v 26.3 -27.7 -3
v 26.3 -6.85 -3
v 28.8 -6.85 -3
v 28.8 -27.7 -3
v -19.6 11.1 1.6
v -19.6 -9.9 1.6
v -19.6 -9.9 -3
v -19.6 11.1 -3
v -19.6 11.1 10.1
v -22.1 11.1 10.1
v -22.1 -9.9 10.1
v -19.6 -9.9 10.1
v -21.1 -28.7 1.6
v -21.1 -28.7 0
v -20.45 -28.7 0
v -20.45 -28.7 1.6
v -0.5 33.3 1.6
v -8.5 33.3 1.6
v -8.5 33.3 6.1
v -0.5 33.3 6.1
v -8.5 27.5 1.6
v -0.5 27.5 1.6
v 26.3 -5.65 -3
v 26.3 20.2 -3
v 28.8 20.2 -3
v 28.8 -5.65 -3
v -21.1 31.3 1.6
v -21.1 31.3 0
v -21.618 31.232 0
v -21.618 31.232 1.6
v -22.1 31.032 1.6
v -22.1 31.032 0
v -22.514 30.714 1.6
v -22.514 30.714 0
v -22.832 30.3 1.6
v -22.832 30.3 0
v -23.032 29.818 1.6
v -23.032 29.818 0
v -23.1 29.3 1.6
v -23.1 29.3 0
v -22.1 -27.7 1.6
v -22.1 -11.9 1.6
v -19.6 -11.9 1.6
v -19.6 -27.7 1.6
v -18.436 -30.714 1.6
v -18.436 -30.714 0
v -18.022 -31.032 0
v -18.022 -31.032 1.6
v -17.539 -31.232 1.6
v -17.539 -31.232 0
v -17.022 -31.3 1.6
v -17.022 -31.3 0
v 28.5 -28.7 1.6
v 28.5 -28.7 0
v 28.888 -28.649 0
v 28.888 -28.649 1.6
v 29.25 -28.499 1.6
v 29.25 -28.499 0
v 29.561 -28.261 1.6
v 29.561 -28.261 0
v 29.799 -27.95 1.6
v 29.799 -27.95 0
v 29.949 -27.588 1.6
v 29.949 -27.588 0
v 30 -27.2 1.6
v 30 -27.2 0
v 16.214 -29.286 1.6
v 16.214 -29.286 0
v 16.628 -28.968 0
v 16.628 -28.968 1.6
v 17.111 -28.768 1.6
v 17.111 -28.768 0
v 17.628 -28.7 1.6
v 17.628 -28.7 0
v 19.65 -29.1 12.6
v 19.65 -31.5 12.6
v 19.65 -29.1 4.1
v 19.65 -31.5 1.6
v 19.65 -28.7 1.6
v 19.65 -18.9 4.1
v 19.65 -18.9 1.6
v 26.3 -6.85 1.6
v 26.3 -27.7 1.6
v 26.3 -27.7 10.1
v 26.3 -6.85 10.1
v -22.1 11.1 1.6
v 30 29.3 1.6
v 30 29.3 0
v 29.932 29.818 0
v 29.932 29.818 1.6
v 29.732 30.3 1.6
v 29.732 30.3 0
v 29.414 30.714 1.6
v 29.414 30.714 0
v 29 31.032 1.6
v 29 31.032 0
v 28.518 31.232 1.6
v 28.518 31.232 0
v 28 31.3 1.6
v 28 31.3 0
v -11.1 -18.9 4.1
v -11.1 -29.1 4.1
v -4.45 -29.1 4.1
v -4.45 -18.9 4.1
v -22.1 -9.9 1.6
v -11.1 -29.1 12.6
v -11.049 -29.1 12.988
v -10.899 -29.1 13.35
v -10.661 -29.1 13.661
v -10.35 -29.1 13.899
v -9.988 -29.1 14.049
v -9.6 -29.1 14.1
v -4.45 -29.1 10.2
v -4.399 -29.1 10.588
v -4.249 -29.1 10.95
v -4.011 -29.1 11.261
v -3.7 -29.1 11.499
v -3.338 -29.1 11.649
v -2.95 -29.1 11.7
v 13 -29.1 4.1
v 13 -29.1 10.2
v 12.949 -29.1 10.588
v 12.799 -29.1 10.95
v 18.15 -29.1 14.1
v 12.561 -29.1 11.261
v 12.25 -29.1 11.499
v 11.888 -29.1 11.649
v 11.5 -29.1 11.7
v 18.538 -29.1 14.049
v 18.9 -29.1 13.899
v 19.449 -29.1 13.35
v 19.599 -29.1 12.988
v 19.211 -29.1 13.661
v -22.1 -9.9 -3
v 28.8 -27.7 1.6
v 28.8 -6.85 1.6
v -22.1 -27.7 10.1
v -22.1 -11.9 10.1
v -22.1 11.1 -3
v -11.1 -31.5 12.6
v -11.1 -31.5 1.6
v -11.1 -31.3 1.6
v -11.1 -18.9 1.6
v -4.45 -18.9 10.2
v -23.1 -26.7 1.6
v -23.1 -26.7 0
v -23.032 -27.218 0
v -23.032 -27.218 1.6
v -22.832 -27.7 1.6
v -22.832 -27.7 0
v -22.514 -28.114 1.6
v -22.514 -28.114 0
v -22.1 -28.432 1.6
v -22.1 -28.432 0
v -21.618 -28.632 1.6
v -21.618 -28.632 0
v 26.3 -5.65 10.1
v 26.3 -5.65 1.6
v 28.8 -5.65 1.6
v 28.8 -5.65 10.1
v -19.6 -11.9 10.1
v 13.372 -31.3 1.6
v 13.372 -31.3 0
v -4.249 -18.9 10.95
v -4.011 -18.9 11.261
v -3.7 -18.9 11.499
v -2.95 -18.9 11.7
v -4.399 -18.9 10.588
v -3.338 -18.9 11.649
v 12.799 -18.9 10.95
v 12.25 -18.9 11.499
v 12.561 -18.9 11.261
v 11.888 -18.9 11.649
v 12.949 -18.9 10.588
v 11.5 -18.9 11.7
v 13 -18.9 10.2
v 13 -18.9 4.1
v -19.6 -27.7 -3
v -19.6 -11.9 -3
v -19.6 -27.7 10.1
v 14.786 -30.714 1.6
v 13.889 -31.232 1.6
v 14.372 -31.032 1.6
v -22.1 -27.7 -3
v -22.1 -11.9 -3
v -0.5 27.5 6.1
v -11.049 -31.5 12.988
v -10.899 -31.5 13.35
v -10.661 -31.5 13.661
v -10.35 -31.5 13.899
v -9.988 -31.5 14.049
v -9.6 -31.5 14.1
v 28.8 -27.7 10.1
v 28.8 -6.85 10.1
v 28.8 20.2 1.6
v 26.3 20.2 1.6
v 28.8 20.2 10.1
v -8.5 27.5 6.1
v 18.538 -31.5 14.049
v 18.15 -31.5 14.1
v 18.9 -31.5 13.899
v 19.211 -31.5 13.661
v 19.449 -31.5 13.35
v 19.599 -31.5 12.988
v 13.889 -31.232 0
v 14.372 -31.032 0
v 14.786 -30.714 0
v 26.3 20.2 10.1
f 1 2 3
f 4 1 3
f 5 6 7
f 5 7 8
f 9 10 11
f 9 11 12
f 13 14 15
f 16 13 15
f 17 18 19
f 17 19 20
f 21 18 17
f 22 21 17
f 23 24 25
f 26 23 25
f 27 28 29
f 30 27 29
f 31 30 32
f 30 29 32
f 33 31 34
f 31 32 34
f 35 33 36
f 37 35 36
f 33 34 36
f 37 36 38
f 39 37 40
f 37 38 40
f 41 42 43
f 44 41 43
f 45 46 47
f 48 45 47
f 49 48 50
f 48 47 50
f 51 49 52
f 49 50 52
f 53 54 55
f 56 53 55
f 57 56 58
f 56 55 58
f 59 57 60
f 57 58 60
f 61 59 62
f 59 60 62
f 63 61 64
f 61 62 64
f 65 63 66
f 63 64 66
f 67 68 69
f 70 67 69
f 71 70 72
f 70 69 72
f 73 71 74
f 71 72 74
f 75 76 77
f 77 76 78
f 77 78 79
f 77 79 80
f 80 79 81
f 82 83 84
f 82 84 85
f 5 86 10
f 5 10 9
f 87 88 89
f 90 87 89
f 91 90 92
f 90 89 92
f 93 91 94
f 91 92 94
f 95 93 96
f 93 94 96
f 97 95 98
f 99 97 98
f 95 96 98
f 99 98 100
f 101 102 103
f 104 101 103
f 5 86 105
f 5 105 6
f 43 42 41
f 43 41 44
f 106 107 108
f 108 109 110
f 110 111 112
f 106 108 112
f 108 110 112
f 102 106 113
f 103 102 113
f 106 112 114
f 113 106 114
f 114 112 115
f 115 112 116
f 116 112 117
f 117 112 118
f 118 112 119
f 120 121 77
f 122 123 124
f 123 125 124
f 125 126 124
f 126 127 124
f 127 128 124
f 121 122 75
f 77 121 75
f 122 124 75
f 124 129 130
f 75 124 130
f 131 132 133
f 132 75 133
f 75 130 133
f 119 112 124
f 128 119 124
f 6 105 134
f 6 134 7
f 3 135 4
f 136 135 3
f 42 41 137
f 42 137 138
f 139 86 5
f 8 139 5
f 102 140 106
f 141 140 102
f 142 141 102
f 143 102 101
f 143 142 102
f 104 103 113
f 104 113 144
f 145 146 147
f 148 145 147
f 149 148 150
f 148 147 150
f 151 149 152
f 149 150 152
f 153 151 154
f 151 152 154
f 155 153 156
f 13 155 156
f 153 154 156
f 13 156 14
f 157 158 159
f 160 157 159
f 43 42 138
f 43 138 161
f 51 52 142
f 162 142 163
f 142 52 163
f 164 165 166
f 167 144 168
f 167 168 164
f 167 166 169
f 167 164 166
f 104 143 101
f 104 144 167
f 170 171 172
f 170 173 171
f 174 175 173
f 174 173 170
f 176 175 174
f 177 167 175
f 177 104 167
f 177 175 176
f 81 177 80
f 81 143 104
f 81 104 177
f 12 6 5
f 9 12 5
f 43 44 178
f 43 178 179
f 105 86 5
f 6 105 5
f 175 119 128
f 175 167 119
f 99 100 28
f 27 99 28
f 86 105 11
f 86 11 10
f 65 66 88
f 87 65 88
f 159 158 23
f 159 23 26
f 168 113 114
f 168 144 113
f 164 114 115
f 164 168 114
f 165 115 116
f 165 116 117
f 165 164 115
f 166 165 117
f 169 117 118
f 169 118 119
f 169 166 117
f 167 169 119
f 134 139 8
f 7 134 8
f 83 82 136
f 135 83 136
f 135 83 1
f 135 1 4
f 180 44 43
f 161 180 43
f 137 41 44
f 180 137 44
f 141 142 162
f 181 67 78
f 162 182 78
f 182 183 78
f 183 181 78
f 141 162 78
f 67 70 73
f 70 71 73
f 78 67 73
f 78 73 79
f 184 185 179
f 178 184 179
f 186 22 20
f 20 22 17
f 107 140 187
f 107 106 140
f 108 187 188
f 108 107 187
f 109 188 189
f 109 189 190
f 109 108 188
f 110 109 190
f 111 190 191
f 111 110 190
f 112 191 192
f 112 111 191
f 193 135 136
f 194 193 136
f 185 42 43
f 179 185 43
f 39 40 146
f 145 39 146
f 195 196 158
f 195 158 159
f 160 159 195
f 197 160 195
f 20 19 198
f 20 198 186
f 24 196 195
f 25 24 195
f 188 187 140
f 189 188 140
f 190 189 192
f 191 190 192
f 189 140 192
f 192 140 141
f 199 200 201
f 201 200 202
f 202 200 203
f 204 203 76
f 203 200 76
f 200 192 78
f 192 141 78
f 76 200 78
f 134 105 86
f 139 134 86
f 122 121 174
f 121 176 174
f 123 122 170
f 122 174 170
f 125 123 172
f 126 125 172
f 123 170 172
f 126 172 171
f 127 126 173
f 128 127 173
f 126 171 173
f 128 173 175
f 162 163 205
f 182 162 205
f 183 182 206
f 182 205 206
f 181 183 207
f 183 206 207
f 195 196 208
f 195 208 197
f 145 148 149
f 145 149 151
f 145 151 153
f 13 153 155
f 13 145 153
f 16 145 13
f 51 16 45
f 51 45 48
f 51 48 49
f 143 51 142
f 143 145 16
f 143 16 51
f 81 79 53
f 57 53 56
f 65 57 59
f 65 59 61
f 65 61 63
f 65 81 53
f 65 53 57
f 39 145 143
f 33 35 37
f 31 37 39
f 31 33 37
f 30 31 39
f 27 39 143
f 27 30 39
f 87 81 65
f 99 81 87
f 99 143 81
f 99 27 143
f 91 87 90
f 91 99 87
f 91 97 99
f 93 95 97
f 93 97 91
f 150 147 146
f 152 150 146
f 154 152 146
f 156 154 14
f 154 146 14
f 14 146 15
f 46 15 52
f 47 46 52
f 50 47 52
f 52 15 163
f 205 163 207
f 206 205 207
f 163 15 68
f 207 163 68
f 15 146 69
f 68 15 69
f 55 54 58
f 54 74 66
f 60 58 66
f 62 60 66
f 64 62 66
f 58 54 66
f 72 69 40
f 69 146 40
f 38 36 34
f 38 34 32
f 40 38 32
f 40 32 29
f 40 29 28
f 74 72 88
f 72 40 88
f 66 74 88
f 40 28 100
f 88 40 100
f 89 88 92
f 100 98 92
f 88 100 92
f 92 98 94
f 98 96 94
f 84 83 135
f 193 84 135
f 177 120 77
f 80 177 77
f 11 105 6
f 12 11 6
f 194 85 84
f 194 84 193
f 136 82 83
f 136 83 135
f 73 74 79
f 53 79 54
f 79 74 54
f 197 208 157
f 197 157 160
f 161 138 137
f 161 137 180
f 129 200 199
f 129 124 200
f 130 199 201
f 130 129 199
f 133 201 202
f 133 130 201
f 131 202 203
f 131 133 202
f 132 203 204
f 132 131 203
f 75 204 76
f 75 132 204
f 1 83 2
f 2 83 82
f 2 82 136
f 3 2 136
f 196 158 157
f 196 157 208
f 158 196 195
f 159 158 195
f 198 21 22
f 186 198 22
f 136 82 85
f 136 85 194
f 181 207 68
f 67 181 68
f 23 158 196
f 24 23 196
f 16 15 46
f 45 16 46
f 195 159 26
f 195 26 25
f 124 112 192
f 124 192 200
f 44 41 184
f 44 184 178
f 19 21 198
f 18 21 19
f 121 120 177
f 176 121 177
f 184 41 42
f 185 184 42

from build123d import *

# Parameters (mm, degrees)
F1_DEPTH  = 1.6
F2_W      = 2.5
F2_H      = 25.85
F2_H_2    = 20.85
F2_H_3    = 21
F2_H_4    = 15.8
F3_DEPTH  = 8.5
F4_DEPTH  = 4.6
F5_W      = 8
F5_H      = 5.8
F6_DEPTH  = 4.5
F7_W      = 30.75
F7_H      = 12.6
F8_DEPTH  = 12.5
F9_W      = 30.75
F9_H      = 10.2
F10_DEPTH = 10
F11_W     = 17.45
F11_H     = 10.2
F12_DEPTH = 7.6
F13_R     = 1.5


with BuildPart() as f1:
    # F0 (on Top) → F1 (new body)
    with BuildSketch(Plane.XY):
        with BuildLine():
            Line((28, 31.3), (-21.1, 31.3))
            ThreePointArc((-21.1, 31.3), (-22.514214, 30.714214), (-23.1, 29.3))
            Line((-23.1, 29.3), (-23.1, -26.7))
            ThreePointArc((-23.1, -26.7), (-22.514214, -28.114214), (-21.1, -28.7))
            Line((-21.1, -28.7), (-20.45, -28.7))
            Line((-20.45, -28.7), (-18.435786, -30.714214))
            ThreePointArc((-18.435786, -30.714214), (-17.78694, -31.147759), (-17.021573, -31.3))
            Line((-17.021573, -31.3), (13.371573, -31.3))
            ThreePointArc((13.371573, -31.3), (14.13694, -31.147759), (14.785786, -30.714214))
            Line((14.785786, -30.714214), (16.214214, -29.285786))
            ThreePointArc((16.214214, -29.285786), (16.86306, -28.852241), (17.628427, -28.7))
            Line((17.628427, -28.7), (28.5, -28.7))
            ThreePointArc((28.5, -28.7), (29.56066, -28.26066), (30, -27.2))
            Line((30, -27.2), (30, 29.3))
            ThreePointArc((30, 29.3), (29.414214, 30.714214), (28, 31.3))
        make_face()
    extrude(amount=F1_DEPTH)

    # F7 (on face) → F8 (join)
    with BuildSketch(Plane.XY.offset(1.6)):
        with Locations((4.275, -25.2)):
            Rectangle(F7_W, F7_H)
    extrude(amount=F8_DEPTH)

    # F9 (on face) → F10 (cut)
    with BuildSketch(Plane.XY.offset(14.1)):
        with Locations((4.275, -24)):
            Rectangle(F9_W, F9_H)
    extrude(amount=-F10_DEPTH, mode=Mode.SUBTRACT)

    # F11 (on face) → F12 (join)
    with BuildSketch(Plane.XY.offset(4.1)):
        with Locations((4.275, -24)):
            Rectangle(F11_W, F11_H)
    extrude(amount=F12_DEPTH)

    # F13
    f13_edges = [f1.edges().sort_by_distance(p)[0] for p in [
        (-4.45, -24, 11.7),
        (13, -24, 11.7),
        (19.65, -30.3, 14.1),
        (-11.1, -30.3, 14.1),
    ]]
    fillet(f13_edges, radius=F13_R)


with BuildPart() as f3:
    # F2 (on face) → F3 (new body)
    with BuildSketch(Plane.XY.offset(1.6)):
        with Locations((27.55, 7.275)):
            Rectangle(F2_W, F2_H)
        with Locations((27.55, -17.275)):
            Rectangle(F2_W, F2_H_2)
        with Locations((-20.85, 0.6)):
            Rectangle(F2_W, F2_H_3)
        with Locations((-20.85, -19.8)):
            Rectangle(F2_W, F2_H_4)
    extrude(amount=F3_DEPTH)


with BuildPart() as f4:
    # F2 (on face) → F4 (new body)
    with BuildSketch(Plane.XY.offset(1.6)):
        with Locations((27.55, 7.275)):
            Rectangle(F2_W, F2_H)
        with Locations((27.55, -17.275)):
            Rectangle(F2_W, F2_H_2)
        with Locations((-20.85, 0.6)):
            Rectangle(F2_W, F2_H_3)
        with Locations((-20.85, -19.8)):
            Rectangle(F2_W, F2_H_4)
    extrude(amount=-F4_DEPTH)


with BuildPart() as f6:
    # F5 (on face) → F6 (new body)
    with BuildSketch(Plane.XY.offset(1.6)):
        with Locations((-4.5, 30.4)):
            Rectangle(F5_W, F5_H)
    extrude(amount=F6_DEPTH)


solid = Compound([f1.part, f3.part, f4.part, f6.part])
